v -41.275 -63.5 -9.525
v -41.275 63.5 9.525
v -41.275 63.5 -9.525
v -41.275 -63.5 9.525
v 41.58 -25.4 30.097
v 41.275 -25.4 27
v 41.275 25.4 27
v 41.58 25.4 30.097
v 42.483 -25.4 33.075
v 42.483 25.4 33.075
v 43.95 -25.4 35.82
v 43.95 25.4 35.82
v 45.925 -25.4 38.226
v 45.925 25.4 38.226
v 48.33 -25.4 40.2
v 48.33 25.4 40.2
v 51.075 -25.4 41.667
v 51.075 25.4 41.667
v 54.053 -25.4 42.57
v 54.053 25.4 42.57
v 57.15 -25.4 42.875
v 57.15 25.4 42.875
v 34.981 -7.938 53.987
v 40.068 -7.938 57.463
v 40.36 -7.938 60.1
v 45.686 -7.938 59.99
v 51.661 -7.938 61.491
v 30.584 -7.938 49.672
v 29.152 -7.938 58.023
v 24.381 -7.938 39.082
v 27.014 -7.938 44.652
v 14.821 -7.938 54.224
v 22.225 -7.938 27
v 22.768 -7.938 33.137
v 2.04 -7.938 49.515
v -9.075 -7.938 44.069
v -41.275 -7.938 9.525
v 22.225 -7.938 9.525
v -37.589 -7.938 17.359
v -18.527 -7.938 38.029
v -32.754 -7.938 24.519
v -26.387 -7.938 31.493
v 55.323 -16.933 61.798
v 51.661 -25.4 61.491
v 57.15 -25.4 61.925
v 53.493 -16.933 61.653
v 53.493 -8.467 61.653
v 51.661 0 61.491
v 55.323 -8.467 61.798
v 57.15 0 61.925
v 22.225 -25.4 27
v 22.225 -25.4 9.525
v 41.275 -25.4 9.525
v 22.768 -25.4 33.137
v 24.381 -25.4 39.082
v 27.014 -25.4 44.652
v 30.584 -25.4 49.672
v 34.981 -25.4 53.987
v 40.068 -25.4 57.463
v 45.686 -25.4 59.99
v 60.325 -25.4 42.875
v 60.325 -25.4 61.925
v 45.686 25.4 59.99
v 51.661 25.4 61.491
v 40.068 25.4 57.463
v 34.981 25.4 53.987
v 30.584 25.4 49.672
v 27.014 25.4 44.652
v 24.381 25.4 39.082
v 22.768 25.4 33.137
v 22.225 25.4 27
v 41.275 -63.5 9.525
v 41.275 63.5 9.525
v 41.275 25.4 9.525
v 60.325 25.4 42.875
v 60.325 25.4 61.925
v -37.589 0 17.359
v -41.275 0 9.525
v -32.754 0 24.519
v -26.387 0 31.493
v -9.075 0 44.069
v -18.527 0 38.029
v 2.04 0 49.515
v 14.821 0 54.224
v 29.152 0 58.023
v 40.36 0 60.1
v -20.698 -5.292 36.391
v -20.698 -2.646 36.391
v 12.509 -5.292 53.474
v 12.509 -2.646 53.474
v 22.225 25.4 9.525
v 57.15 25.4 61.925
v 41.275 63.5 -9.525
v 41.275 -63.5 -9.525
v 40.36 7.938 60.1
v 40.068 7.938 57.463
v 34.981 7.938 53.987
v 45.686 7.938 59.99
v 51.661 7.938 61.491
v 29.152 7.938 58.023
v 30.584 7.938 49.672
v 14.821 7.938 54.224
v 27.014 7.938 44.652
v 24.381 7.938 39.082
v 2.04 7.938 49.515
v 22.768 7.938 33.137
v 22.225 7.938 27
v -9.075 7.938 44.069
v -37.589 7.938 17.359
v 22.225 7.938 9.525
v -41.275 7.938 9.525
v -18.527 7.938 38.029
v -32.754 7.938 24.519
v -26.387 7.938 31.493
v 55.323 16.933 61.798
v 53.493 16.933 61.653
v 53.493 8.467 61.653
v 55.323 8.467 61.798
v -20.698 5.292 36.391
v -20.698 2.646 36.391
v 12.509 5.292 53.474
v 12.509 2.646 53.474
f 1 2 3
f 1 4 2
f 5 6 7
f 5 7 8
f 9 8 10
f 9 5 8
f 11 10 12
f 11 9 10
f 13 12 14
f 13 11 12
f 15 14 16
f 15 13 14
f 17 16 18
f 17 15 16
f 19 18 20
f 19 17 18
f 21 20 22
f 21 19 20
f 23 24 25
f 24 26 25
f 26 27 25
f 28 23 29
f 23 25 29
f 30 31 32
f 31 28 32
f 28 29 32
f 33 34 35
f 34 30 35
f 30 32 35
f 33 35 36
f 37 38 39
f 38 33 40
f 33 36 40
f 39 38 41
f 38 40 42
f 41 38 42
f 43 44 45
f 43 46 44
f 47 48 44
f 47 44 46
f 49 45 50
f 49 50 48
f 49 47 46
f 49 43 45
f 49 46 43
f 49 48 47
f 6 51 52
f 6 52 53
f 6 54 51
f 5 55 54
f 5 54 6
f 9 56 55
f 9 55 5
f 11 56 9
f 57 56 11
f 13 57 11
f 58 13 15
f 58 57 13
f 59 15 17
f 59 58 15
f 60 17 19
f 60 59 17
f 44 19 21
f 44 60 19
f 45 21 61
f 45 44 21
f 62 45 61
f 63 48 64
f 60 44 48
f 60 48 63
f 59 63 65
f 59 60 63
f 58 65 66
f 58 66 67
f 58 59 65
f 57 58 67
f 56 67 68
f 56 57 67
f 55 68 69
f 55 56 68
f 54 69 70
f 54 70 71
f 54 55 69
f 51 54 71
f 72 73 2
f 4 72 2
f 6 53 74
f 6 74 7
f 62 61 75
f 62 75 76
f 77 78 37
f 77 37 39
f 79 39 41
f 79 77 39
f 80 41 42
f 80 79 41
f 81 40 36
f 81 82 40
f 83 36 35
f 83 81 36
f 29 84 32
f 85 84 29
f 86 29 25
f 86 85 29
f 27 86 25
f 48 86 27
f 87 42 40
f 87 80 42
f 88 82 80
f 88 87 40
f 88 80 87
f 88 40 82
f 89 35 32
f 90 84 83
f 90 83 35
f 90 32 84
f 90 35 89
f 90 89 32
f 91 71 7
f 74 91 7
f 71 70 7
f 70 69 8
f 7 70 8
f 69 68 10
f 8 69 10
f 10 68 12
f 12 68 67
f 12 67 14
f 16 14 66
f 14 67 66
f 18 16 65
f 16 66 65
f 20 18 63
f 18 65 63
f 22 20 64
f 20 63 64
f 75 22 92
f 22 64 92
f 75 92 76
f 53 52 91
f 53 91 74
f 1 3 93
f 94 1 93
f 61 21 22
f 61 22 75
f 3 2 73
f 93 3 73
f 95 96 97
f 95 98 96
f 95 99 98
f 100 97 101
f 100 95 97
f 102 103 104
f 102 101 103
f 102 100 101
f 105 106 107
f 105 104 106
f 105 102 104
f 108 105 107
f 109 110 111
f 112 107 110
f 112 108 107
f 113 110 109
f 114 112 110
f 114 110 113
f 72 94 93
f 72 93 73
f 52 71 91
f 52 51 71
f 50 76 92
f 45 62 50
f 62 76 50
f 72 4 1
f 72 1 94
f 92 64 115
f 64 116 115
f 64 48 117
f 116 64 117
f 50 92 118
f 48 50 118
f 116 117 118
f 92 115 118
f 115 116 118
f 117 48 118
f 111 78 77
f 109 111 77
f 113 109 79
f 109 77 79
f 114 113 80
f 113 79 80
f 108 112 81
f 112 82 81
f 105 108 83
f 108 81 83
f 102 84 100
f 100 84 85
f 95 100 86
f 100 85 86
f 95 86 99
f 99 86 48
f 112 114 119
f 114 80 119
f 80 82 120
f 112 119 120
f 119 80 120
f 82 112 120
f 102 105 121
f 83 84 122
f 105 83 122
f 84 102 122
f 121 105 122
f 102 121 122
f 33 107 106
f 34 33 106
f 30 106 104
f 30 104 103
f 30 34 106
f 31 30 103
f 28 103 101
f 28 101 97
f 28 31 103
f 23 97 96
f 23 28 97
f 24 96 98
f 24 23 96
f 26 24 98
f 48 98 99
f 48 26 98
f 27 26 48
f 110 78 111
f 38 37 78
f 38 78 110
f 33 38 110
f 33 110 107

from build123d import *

# Parameters (mm, degrees)
F1_DEPTH = 63.5
F2_DEPTH = 25.4
F3_DEPTH = 7.9375


with BuildPart() as f1:
    # F0 (on Front) → F1 (new body, symmetric)
    with BuildSketch(Plane.XZ):
        Polygon((22.225, 9.525), (-41.275, 9.525), (-41.275, -9.525), (41.275, -9.525), (41.275, 9.525), align=None)
    extrude(amount=F1_DEPTH, both=True)


with BuildPart() as f2:
    # F0 (on Front) → F2 (new body, symmetric)
    with BuildSketch(Plane.XZ):
        with BuildLine():
            Line((22.225, 27.0002), (22.225, 9.525))
            Line((22.225, 9.525), (41.275, 9.525))
            Line((41.275, 9.525), (41.275, 27.0002))
            ThreePointArc((41.275, 27.0002), (45.92468, 38.22552), (57.15, 42.8752))
            Line((57.15, 42.8752), (60.325, 42.8752))
            Line((60.325, 42.8752), (60.325, 61.9252))
            Line((60.325, 61.9252), (57.15, 61.9252))
            add(Edge.make_bspline(
                [(51.660777, 61.491127), (53.493837, 61.662156), (55.324551, 61.806743), (57.15, 61.9252)],
                knots=[106.606317, 106.606317, 106.606317, 106.606317, 111.504536, 111.504536, 111.504536, 111.504536], degree=3))
            ThreePointArc((51.660777, 61.491127), (30.584358, 49.672259), (22.225, 27.0002))
        make_face()
    extrude(amount=F2_DEPTH, both=True)


with BuildPart() as f3:
    # F0 (on Front) → F3 (new body, symmetric)
    with BuildSketch(Plane.XZ):
        with BuildLine():
            add(Edge.make_bspline(
                [(-41.275, 9.525), (-29.241061, 41.521348), (11.765518, 57.768809), (51.660777, 61.491127)],
                knots=[0, 0, 0, 0, 106.606317, 106.606317, 106.606317, 106.606317], degree=3))
            Line((-41.275, 9.525), (22.225, 9.525))
            Line((22.225, 9.525), (22.225, 27.0002))
            ThreePointArc((22.225, 27.0002), (30.584358, 49.672259), (51.660777, 61.491127))
        make_face()
    extrude(amount=F3_DEPTH, both=True)


solid = Compound([f1.part, f2.part, f3.part])
